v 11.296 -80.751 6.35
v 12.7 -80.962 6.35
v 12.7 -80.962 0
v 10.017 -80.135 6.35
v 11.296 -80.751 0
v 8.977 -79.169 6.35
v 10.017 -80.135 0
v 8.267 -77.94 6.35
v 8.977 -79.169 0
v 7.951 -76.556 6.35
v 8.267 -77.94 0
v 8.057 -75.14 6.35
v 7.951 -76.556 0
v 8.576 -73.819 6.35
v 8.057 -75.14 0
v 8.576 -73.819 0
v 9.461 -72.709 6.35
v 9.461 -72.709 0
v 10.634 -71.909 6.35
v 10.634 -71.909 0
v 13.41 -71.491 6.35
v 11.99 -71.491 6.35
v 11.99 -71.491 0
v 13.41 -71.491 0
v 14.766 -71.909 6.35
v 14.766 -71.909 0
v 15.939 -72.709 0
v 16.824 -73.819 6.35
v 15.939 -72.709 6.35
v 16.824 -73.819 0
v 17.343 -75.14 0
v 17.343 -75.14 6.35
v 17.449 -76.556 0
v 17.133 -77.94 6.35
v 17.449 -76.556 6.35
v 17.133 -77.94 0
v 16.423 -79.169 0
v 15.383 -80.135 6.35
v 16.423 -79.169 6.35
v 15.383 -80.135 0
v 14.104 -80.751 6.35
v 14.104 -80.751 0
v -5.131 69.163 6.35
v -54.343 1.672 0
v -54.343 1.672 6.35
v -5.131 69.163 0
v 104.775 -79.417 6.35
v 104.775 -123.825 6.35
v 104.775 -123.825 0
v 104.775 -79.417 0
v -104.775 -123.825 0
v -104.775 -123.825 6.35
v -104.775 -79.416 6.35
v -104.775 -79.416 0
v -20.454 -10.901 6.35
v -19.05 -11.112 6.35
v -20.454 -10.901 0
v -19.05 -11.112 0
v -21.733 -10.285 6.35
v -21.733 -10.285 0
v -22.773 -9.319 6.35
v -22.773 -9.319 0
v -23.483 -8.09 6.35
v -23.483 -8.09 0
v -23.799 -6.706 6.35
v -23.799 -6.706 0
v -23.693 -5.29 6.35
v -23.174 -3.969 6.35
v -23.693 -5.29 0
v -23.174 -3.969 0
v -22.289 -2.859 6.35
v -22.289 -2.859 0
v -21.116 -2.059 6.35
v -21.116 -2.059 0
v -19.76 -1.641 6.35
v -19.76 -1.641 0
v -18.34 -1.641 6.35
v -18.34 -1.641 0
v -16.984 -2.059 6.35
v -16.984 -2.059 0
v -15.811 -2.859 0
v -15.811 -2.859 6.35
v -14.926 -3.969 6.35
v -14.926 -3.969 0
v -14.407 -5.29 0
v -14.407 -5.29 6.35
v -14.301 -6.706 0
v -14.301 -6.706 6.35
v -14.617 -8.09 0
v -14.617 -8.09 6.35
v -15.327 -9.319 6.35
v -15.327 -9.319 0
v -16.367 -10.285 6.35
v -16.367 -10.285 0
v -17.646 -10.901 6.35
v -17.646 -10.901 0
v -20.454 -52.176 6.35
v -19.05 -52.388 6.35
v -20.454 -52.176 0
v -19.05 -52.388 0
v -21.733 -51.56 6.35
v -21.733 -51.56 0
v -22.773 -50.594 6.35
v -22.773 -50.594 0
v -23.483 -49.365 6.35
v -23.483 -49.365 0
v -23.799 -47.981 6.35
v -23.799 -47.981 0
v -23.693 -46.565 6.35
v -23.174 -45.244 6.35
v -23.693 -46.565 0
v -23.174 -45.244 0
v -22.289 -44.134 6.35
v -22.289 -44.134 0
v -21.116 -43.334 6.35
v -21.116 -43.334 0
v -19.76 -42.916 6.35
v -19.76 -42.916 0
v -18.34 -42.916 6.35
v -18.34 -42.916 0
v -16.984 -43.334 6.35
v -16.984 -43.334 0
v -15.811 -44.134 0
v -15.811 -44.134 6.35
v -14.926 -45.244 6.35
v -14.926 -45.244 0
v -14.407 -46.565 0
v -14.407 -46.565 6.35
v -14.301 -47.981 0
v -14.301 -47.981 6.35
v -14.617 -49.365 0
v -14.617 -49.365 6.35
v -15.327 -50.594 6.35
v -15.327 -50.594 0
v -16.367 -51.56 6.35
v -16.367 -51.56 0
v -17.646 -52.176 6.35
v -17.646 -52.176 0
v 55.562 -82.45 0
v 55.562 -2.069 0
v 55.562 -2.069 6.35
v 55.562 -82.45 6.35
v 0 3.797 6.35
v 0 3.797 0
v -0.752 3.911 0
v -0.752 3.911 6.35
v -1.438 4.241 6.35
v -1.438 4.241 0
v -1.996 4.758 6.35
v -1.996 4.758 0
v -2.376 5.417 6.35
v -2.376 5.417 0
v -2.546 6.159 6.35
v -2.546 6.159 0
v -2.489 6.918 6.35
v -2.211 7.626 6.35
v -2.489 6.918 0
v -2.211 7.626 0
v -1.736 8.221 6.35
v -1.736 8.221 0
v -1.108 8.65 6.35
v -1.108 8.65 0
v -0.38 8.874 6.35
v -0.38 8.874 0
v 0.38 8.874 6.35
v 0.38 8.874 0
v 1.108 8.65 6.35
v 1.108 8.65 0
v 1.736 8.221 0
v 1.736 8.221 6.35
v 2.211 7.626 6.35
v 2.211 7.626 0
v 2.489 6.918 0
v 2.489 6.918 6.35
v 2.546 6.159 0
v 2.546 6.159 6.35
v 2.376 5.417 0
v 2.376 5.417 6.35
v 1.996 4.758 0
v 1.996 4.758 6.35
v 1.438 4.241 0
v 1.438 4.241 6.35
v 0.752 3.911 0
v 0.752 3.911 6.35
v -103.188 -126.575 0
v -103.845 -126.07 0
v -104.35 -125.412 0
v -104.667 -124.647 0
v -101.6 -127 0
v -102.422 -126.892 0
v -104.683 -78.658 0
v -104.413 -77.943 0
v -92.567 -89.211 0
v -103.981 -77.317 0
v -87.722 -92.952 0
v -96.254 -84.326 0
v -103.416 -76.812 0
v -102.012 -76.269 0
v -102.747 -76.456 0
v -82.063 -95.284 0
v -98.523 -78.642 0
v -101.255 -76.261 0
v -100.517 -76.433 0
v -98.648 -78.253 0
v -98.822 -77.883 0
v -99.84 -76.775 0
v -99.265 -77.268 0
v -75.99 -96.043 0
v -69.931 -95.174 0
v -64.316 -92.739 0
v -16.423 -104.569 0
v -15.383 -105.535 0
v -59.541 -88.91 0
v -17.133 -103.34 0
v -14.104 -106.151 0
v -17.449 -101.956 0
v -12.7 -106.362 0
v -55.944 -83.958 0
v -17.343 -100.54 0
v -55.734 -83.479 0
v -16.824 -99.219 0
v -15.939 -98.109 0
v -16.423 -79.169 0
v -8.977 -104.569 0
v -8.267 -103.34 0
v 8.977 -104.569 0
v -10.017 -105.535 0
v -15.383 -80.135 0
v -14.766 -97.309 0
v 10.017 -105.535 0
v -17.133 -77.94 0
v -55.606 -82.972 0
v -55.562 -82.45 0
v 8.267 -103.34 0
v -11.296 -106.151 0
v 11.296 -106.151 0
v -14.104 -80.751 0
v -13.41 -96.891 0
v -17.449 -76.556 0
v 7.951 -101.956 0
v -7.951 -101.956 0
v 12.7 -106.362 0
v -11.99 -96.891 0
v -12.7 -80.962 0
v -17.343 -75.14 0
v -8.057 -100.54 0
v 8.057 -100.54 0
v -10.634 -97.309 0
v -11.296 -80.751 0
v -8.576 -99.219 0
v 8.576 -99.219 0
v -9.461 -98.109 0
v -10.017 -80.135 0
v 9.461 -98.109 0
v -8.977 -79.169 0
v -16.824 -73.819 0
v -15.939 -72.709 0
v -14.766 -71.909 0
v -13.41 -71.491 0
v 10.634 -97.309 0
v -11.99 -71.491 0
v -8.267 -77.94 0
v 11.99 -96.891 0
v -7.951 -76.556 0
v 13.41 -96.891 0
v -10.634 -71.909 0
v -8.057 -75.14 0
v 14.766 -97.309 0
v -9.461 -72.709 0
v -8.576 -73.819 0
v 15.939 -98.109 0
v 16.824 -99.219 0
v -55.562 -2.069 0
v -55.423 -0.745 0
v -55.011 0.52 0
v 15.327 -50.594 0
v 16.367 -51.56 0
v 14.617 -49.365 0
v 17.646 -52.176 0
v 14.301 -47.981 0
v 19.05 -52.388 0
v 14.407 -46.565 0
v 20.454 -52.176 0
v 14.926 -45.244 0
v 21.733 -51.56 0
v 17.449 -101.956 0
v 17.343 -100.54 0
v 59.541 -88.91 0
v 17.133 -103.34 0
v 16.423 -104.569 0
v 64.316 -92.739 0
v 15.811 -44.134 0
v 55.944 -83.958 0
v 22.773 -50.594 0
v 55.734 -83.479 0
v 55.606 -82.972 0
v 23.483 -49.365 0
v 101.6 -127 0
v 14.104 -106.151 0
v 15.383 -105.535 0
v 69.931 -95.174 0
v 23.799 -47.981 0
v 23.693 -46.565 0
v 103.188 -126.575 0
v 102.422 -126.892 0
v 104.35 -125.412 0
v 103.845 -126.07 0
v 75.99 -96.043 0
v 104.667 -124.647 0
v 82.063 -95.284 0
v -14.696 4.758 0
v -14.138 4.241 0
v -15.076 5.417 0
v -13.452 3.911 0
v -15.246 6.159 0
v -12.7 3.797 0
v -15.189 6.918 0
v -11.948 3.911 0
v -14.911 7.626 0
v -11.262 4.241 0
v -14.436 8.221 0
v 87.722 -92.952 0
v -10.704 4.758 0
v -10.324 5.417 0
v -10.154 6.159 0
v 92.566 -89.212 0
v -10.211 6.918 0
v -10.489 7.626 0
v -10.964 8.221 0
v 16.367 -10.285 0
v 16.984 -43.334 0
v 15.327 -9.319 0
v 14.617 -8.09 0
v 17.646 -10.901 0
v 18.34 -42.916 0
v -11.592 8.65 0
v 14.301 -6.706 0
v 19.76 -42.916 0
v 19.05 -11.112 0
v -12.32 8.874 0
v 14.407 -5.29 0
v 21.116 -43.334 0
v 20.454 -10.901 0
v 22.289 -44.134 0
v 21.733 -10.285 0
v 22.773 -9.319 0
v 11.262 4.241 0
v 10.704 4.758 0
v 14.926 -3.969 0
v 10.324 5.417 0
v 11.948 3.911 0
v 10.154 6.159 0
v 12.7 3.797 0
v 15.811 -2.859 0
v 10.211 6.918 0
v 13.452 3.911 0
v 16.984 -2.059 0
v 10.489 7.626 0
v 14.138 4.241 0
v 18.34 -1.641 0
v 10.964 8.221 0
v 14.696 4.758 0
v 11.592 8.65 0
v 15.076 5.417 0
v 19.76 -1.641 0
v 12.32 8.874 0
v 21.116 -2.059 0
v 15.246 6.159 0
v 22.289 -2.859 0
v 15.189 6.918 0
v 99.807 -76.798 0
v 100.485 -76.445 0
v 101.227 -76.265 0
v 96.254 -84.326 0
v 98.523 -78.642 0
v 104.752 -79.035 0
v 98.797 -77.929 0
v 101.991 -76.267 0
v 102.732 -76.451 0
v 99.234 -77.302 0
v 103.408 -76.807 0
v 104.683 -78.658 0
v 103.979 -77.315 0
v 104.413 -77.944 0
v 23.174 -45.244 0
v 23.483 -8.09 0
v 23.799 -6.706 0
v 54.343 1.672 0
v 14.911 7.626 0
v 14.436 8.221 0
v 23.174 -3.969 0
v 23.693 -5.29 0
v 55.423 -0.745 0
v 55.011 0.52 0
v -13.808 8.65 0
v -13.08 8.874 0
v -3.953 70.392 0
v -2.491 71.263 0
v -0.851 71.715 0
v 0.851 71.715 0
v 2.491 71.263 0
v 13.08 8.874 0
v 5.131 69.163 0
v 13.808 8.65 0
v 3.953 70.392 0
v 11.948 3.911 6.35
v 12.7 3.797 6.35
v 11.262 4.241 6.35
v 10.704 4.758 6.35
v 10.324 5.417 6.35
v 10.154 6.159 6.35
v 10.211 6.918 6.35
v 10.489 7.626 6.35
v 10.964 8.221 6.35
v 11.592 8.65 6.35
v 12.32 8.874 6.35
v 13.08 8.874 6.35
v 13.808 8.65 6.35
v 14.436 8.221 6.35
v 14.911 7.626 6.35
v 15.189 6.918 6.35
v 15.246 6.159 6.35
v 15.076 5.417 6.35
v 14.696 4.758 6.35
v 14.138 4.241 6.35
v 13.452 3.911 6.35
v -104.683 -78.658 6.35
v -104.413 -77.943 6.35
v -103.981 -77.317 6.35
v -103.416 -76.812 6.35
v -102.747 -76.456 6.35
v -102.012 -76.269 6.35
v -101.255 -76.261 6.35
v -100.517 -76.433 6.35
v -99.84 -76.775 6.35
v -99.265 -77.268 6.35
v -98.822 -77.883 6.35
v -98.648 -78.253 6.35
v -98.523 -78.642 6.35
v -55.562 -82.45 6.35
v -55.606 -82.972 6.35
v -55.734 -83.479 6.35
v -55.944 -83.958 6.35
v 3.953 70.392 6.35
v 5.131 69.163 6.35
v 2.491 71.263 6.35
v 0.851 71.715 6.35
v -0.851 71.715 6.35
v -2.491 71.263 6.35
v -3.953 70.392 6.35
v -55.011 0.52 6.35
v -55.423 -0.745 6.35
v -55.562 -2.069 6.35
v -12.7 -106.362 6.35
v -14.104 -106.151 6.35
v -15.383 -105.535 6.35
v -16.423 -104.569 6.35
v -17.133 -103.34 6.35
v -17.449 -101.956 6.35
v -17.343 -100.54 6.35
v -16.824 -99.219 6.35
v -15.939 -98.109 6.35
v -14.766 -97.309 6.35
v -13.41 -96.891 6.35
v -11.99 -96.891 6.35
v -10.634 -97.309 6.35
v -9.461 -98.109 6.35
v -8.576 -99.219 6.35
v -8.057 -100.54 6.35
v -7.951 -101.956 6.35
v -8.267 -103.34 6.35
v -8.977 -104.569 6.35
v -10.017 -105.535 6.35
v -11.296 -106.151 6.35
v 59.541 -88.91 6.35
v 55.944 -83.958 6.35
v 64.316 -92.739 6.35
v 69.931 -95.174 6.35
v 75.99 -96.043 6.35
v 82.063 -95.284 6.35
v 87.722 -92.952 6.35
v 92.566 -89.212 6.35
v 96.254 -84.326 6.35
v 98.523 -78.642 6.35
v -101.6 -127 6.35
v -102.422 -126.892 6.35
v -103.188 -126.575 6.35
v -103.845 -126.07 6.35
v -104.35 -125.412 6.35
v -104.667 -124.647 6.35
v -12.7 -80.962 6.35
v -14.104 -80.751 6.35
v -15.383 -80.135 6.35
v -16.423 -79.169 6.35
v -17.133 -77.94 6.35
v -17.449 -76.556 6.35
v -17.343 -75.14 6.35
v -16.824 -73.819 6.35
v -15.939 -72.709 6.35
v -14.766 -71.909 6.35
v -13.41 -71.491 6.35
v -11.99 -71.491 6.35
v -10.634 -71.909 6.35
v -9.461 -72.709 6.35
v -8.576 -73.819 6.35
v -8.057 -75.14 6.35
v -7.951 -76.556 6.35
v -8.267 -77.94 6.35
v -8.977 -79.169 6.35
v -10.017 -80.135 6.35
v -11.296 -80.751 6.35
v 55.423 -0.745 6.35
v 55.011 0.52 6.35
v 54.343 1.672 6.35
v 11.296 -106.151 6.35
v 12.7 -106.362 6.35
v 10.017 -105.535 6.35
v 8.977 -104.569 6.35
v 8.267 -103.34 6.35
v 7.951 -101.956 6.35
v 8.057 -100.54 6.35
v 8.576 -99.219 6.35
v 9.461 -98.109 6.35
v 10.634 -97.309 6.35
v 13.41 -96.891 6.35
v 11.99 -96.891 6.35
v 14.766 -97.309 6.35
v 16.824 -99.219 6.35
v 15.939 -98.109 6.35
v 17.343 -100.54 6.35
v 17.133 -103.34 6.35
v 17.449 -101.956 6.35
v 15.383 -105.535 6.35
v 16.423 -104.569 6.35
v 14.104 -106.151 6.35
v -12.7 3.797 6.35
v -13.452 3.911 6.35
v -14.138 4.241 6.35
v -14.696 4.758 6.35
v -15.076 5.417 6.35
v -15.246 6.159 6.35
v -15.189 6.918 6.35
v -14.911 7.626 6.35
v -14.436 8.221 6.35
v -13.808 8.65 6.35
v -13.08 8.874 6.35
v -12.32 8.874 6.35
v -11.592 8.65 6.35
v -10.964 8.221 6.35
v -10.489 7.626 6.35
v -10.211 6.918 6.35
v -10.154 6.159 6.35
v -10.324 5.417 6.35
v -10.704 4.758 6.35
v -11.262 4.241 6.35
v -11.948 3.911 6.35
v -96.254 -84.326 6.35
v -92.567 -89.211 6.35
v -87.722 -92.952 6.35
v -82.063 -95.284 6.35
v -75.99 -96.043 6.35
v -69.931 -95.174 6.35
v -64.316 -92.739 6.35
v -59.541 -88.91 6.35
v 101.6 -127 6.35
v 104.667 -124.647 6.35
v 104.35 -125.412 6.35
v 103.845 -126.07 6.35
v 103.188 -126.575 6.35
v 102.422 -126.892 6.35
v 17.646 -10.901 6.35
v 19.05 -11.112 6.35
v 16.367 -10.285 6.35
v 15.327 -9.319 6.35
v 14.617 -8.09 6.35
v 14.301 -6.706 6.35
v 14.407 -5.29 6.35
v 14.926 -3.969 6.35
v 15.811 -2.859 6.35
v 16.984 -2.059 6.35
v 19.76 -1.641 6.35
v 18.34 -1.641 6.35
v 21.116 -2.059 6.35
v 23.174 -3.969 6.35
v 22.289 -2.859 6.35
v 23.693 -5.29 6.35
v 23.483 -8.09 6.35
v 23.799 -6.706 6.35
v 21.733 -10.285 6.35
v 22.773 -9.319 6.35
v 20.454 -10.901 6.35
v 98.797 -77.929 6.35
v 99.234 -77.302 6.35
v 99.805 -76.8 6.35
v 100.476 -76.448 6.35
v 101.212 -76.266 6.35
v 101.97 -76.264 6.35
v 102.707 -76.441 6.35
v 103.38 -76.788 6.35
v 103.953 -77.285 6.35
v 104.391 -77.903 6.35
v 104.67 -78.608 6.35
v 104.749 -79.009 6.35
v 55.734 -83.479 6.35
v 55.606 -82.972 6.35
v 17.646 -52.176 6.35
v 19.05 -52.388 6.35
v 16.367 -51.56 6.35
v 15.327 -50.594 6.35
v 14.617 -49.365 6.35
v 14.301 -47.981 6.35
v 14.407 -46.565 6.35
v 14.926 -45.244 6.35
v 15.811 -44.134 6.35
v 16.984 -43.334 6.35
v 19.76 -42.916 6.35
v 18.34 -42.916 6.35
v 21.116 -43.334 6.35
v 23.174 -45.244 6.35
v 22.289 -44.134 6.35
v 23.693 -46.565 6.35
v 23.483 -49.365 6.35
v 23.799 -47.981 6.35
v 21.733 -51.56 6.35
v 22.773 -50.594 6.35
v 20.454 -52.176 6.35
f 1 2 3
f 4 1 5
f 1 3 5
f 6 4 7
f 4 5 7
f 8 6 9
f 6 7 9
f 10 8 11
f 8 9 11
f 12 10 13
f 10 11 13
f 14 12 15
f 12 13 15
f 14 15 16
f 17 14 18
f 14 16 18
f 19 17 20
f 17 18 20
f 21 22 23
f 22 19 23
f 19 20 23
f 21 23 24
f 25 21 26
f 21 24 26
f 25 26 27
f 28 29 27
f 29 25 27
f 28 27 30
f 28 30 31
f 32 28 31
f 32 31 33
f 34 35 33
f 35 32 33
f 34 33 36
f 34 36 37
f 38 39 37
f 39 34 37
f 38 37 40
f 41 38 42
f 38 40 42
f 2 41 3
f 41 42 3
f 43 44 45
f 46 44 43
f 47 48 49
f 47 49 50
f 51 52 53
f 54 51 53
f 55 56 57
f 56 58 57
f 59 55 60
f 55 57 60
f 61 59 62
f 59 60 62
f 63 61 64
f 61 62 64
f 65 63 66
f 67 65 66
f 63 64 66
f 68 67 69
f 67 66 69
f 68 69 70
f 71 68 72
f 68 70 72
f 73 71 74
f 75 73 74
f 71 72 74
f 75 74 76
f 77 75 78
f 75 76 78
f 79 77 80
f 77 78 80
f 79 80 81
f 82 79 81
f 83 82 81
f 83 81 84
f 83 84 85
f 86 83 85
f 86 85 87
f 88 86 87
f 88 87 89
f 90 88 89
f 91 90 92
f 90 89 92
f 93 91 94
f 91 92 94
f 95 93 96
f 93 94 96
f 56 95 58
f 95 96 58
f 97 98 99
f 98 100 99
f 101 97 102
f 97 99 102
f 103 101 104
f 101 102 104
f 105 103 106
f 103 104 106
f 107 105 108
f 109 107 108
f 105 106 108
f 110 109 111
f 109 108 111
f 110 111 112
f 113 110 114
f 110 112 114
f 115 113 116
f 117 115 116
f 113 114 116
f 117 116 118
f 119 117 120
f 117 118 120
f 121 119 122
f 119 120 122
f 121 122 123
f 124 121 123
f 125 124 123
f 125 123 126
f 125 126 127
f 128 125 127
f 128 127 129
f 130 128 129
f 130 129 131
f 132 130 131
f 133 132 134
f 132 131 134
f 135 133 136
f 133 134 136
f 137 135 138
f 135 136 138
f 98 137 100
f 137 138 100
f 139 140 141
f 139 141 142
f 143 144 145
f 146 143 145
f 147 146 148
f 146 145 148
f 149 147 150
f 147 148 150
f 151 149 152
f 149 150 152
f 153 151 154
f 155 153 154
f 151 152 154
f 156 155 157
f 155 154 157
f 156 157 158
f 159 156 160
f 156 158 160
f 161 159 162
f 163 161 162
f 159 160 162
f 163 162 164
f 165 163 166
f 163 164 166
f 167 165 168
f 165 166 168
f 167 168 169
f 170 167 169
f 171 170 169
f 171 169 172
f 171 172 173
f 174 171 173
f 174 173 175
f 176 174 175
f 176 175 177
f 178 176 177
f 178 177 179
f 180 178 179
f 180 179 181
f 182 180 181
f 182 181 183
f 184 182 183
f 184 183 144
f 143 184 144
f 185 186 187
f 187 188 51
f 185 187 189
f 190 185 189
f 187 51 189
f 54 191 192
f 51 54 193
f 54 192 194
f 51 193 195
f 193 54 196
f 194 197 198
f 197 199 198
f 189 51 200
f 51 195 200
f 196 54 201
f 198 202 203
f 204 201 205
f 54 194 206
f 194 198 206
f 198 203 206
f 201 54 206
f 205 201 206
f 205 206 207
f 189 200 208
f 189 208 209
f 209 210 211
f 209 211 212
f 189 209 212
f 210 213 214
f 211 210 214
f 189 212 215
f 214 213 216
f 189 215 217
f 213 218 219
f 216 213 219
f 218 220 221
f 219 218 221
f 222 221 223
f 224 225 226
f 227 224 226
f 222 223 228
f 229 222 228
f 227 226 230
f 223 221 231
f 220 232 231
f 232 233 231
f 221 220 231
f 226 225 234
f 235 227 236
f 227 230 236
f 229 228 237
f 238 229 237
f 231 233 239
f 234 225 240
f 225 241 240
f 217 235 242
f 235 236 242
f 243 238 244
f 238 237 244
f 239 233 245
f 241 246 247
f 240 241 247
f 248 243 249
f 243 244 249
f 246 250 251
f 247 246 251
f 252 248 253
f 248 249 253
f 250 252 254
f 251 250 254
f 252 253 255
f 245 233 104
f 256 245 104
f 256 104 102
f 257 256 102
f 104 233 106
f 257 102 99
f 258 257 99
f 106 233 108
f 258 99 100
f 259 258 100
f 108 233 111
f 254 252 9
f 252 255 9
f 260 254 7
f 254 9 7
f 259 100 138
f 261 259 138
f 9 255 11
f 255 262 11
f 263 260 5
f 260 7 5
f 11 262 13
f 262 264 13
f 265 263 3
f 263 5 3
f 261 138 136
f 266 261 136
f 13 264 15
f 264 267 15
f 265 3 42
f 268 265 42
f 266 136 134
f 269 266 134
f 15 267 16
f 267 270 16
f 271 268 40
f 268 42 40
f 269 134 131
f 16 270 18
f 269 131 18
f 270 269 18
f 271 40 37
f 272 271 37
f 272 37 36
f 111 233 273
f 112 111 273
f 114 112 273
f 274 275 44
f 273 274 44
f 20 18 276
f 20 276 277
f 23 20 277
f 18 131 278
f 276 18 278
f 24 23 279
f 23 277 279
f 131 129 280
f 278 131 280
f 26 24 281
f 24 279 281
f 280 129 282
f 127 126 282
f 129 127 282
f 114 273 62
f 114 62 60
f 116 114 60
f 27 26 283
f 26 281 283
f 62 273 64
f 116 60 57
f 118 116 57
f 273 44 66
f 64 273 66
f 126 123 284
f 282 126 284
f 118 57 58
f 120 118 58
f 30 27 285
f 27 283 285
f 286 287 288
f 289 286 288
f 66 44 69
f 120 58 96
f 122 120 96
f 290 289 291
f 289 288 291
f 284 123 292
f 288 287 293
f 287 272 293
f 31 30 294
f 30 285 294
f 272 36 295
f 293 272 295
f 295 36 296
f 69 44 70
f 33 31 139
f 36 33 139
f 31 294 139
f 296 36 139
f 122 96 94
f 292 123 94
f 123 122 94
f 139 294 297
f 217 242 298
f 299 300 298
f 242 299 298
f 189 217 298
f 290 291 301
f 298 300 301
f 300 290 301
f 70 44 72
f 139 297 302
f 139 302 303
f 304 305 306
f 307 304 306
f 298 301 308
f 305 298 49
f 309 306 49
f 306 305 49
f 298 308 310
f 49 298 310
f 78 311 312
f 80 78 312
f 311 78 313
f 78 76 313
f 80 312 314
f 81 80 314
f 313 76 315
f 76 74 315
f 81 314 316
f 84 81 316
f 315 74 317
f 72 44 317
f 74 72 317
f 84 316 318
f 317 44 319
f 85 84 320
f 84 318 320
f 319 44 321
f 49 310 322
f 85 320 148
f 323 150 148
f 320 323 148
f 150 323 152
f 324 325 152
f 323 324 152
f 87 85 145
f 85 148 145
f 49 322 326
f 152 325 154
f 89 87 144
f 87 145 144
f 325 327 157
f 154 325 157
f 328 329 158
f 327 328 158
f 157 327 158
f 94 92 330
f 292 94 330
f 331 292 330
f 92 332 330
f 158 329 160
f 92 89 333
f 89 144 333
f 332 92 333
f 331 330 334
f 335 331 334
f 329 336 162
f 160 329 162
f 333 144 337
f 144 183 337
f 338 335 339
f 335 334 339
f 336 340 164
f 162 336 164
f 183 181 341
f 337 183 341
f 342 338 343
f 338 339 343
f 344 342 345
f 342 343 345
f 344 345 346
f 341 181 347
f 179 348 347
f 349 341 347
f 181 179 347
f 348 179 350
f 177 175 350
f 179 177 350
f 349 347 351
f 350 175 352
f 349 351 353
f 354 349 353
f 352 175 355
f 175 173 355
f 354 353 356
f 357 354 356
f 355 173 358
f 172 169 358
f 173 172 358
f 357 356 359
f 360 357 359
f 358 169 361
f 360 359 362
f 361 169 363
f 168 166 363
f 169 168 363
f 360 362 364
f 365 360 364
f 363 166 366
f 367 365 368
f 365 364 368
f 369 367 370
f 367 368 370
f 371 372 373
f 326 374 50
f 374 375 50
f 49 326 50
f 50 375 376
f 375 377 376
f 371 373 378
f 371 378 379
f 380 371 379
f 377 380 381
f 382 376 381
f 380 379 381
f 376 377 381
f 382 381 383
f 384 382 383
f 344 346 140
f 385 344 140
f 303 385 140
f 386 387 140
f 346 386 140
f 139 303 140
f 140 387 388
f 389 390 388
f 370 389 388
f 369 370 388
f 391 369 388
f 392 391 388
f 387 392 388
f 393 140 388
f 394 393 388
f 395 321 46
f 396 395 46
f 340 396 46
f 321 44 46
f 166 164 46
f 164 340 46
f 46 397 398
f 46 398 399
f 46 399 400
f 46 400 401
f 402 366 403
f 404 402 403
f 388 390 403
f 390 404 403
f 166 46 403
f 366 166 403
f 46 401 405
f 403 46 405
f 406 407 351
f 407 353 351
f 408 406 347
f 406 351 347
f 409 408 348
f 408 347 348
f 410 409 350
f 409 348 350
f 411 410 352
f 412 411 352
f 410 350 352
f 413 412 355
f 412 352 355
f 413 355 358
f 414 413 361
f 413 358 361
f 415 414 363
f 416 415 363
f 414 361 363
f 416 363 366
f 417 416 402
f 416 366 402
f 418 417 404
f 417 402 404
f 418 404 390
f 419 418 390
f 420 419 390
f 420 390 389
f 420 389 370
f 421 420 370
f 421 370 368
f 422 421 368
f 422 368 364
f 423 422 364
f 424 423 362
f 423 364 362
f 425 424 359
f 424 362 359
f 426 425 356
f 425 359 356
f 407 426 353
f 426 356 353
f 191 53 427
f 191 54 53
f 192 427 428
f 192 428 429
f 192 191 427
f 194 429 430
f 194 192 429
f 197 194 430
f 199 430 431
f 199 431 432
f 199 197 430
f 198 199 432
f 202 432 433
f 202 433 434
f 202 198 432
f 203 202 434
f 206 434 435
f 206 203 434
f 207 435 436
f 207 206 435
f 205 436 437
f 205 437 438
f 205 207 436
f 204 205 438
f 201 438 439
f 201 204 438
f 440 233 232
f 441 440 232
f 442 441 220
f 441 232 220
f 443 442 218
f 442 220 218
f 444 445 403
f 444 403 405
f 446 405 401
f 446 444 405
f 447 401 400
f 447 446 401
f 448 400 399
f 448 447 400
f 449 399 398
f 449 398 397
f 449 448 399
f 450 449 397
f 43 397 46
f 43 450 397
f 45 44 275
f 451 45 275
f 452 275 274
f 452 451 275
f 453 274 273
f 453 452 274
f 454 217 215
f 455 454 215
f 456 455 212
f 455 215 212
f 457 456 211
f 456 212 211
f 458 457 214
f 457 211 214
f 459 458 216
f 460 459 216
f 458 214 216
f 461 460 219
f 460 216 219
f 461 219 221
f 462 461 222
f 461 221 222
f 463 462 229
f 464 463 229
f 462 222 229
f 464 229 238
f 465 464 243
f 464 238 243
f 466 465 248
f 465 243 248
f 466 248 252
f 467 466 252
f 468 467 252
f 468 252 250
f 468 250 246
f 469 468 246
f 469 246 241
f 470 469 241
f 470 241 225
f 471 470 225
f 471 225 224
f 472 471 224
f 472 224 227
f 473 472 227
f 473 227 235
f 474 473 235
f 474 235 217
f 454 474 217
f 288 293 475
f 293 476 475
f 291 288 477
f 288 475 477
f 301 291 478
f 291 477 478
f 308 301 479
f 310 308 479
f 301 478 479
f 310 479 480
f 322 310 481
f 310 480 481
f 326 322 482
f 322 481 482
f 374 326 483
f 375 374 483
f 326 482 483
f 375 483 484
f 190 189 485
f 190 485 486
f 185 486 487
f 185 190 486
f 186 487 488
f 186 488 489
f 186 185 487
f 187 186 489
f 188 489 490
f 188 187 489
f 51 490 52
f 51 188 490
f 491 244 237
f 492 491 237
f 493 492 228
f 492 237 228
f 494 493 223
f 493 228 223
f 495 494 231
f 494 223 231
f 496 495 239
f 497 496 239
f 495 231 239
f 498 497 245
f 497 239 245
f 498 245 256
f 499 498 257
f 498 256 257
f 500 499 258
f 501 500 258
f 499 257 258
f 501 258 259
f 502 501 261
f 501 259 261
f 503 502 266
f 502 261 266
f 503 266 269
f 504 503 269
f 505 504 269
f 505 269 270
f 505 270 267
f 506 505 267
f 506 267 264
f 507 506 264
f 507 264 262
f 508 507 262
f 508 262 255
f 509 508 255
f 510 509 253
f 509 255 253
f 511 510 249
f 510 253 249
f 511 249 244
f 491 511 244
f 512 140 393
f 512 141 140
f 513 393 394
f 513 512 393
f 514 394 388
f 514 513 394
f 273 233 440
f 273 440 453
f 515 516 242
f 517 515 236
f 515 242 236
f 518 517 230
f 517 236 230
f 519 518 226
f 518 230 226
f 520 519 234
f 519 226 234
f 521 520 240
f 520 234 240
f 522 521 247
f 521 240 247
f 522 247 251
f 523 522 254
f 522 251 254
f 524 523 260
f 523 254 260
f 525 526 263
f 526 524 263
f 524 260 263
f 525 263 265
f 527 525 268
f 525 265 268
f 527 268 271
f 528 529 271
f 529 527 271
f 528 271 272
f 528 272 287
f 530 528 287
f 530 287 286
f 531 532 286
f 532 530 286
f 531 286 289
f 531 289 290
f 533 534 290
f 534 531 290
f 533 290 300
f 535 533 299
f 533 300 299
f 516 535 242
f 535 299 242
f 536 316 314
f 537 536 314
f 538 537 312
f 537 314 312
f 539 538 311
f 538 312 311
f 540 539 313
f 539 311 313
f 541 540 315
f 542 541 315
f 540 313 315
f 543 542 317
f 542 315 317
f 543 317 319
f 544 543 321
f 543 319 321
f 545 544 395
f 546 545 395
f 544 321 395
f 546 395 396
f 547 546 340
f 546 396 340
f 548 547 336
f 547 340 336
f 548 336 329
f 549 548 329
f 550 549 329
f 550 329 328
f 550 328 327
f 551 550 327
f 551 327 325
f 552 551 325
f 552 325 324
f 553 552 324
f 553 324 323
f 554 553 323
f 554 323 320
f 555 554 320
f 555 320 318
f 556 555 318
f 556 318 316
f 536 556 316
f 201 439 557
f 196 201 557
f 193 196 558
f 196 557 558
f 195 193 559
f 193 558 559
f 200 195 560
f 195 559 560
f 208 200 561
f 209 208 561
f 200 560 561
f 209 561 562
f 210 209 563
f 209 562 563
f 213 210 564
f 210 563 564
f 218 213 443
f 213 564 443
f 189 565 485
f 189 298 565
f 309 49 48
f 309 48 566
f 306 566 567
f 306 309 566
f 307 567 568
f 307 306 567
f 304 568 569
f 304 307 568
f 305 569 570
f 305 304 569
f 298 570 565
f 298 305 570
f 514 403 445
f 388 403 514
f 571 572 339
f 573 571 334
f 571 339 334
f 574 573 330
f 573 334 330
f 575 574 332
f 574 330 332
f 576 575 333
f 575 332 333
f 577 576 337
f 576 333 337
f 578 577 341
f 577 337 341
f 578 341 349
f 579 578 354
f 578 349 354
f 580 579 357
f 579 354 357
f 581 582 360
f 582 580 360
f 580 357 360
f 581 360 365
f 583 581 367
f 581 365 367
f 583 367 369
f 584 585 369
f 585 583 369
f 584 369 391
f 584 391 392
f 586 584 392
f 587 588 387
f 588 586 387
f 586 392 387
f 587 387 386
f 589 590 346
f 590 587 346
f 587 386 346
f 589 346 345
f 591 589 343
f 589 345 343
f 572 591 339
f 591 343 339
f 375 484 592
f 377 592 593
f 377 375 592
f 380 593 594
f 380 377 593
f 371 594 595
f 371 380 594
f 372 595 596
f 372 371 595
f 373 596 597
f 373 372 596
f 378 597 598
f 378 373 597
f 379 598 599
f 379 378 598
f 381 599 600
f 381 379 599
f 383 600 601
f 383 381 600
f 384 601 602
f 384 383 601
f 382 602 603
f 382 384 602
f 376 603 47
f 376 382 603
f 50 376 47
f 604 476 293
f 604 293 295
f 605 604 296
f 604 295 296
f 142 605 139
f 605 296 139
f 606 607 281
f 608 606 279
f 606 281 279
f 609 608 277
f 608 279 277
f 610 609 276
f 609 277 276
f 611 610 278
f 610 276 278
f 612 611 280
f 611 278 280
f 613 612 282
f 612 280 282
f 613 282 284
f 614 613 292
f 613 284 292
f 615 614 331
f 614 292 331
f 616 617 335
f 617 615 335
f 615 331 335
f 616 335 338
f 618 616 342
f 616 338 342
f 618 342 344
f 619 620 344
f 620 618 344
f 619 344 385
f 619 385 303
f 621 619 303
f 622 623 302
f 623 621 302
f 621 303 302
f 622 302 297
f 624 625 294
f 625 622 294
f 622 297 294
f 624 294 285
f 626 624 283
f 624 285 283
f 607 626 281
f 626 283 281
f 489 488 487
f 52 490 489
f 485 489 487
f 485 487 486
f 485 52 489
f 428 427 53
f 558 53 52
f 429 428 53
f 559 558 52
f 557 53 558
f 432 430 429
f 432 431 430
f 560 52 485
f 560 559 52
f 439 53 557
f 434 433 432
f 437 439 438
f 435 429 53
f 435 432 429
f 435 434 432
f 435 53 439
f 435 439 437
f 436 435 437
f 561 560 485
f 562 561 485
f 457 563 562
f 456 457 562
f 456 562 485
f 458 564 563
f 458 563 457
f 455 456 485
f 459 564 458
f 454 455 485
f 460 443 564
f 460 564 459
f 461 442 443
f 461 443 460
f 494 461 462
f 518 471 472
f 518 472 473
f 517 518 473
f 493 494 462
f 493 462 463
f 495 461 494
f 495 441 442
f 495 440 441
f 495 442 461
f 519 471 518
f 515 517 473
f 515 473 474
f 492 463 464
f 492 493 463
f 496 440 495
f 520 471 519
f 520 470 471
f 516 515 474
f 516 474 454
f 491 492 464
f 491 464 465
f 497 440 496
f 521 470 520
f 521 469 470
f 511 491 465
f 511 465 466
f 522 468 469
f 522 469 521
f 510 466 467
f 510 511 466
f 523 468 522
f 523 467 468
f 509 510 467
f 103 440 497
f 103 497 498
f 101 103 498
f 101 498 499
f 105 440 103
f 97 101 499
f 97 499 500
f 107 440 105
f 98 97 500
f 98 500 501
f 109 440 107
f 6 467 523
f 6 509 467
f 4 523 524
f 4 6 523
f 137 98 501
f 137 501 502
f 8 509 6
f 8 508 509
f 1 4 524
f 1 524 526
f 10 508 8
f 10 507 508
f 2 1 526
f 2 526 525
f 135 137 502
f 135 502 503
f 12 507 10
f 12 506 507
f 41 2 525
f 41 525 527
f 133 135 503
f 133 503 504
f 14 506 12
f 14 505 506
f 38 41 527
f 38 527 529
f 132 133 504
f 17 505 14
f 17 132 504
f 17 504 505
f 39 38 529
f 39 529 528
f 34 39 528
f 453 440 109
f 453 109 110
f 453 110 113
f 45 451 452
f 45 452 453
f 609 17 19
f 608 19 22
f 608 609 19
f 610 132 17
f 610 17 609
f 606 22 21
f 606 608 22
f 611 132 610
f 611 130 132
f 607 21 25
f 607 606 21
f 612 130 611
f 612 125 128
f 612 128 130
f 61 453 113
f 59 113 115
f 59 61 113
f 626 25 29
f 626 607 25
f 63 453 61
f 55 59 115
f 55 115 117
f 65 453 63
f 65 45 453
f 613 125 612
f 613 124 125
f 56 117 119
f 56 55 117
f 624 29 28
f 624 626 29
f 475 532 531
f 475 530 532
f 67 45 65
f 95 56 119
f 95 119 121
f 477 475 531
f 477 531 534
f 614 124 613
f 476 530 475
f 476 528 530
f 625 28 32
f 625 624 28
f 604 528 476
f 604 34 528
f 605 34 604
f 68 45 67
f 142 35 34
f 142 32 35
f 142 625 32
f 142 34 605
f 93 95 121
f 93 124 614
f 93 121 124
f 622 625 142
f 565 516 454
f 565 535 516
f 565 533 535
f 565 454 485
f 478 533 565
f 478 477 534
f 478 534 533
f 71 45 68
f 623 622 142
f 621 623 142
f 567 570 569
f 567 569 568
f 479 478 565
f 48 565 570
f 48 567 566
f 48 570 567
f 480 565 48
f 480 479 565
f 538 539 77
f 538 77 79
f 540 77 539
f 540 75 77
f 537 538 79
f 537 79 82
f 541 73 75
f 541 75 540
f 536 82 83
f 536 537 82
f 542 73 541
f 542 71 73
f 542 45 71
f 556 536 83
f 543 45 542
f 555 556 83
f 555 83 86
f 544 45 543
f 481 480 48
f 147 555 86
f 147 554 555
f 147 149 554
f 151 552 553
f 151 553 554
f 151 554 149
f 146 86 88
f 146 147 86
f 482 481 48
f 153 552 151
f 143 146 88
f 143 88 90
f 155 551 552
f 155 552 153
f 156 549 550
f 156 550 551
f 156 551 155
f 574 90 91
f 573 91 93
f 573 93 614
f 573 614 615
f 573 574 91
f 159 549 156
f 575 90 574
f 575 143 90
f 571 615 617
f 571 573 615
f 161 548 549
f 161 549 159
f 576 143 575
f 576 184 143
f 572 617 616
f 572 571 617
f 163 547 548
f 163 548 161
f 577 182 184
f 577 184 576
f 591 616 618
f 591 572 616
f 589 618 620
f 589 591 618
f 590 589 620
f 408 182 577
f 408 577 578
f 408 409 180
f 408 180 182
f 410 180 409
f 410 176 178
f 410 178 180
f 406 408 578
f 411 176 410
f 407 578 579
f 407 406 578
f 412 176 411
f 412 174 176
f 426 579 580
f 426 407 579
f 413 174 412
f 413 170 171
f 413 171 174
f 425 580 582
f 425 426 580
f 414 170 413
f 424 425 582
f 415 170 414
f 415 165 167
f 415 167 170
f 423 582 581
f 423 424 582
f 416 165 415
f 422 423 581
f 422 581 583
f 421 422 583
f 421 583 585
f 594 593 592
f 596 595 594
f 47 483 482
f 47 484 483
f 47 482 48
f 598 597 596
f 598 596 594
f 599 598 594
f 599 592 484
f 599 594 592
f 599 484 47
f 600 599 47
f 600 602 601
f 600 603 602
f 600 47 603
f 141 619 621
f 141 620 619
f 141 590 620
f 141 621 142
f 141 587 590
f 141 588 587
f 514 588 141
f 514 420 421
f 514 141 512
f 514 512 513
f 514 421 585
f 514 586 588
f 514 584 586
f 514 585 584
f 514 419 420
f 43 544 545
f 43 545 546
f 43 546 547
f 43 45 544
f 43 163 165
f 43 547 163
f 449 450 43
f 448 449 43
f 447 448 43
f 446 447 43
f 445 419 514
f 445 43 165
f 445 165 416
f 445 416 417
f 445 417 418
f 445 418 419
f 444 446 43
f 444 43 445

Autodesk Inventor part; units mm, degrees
ref_plane "YZ Plane" through (0, 0, 0) normal (1, 0, 0) x (0, 1, 0)
ref_plane "XZ Plane" through (0, 0, 0) normal (0, 1, 0) x (-1, 0, 0)
ref_plane "XY Plane" through (0, 0, 0) normal (0, 0, 1) x (1, 0, 0)
sketch "Sketch1" plane through (0, 0, 0) normal (0, 0, 1) x (1, 0, 0)
  line L0 (55.5625, 0) -> (-55.5625, 0)
  line L1 (-55.5625, 0) -> (0, 76.2)
  line L2 (0, 76.2) -> (55.5625, 0)
  line L3 (-55.5625, 0) -> (55.5625, 0)
  line L4 (55.5625, 0) -> (55.5625, -127)
  line L5 (55.5625, -127) -> (-55.5625, -127)
  line L6 (-55.5625, -127) -> (-55.5625, 0)
  point P0 (0, 0)
  point P1 (0, 0)
  dimension "d0" = 111.125
  dimension "d1" = 76.2
  dimension "d14" = 127
extrude "Extrusion1" add sketch "Sketch1" along normal blind 6.35
sketch "Sketch2" plane through (0, 0, 6.35) normal (0, 0, 1) x (1, 0, 0)
  line L0 (-12.7, 6.35) -> (12.7, 6.35) construction
  line L1 (-55.5625, -127) -> (55.5625, -127) construction
  point P0 (0, 6.35)
  point P1 (0, 6.35)
  point P2 (0, 76.2)
  dimension "d6" = 25.4
  dimension "d15" = 133.35
hole "Hole1" at (-12.7, 6.35, 6.35) at (0, 6.35, 6.35) at (12.7, 6.35, 6.35) direction (0, 0, -1) diameter 5.1054 end through all clearance for "Flat Head Machine Screw (82)" size "#10" standard "Ansi Unified Screw Threads"
fillet "Fillet2" radius 6.35 5 edges at (-55.5625, 0, 3.175) (55.5625, 0, 3.175) (0, 76.2, 3.175) (-55.5625, -127, 3.175) (55.5625, -127, 3.175)
sketch "Sketch3" plane through (0, 0, 6.35) normal (0, 0, 1) x (1, 0, 0)
  arc A0 (49.2125, -127) -> (55.5625, -120.65) centre (49.2125, -120.65) ccw construction
  line L0 (55.5625, -120.65) -> (55.5625, -2.0693) construction
  arc A1 (55.5625, -2.0693) -> (54.3433, 1.672) centre (49.2125, -2.0693) ccw construction
  line L1 (54.3433, 1.672) -> (5.1308, 69.1634) construction
  arc A2 (5.1308, 69.1634) -> (-5.1308, 69.1634) centre (0, 65.4222) ccw construction
  line L2 (-5.1308, 69.1634) -> (-54.3433, 1.672) construction
  arc A3 (-54.3433, 1.672) -> (-55.5625, -2.0693) centre (-49.2125, -2.0693) ccw construction
  line L3 (-55.5625, -2.0693) -> (-55.5625, -120.65) construction
  arc A4 (-55.5625, -120.65) -> (-49.2125, -127) centre (-49.2125, -120.65) ccw construction
  line L4 (-49.2125, -127) -> (49.2125, -127) construction
  circle A5 centre (0, 6.35) radius 2.5527 construction
  circle A6 centre (-12.7, 6.35) radius 2.5527 construction
  circle A7 centre (12.7, 6.35) radius 2.5527 construction
  line L5 (0, 31.75) -> (-30.7945, 0.9555) construction
  line L6 (0, 31.75) -> (30.7945, 0.9555) construction
  point P0 (0, 0)
  dimension "d17" = 25.4
sketch "Sketch4" plane through (0, 0, 6.35) normal (0, 0, 1) x (1, 0, 0)
  arc A0 (49.2125, -127) -> (55.5625, -120.65) centre (49.2125, -120.65) ccw construction
  line L0 (55.5625, -120.65) -> (55.5625, -2.0693) construction
  arc A1 (55.5625, -2.0693) -> (54.3433, 1.672) centre (49.2125, -2.0693) ccw construction
  line L1 (54.3433, 1.672) -> (5.1308, 69.1634) construction
  arc A2 (5.1308, 69.1634) -> (-5.1308, 69.1634) centre (0, 65.4222) ccw construction
  line L2 (-5.1308, 69.1634) -> (-54.3433, 1.672) construction
  arc A3 (-54.3433, 1.672) -> (-55.5625, -2.0693) centre (-49.2125, -2.0693) ccw construction
  line L3 (-55.5625, -2.0693) -> (-55.5625, -120.65) construction
  arc A4 (-55.5625, -120.65) -> (-49.2125, -127) centre (-49.2125, -120.65) ccw construction
  line L4 (-49.2125, -127) -> (49.2125, -127) construction
  circle A5 centre (0, 6.35) radius 2.5527 construction
  circle A6 centre (-12.7, 6.35) radius 2.5527 construction
  circle A7 centre (12.7, 6.35) radius 2.5527 construction
  point P0 (0, 0)
  point P1 (-12.7, -101.6)
  point P2 (-12.7, -76.2)
  point P3 (-19.05, -47.625)
  point P4 (-19.05, -6.35)
  dimension "d24" = 12.7
  dimension "d25" = 19.05
  dimension "d26" = 53.975
  dimension "d27" = 19.05
  dimension "d28" = 12.7
  dimension "d29" = 82.55
  dimension "d30" = 107.95
hole "Hole2" at (-12.7, -101.6, 6.35) at (-12.7, -76.2, 6.35) at (-19.05, -47.625, 6.35) at (-19.05, -6.35, 6.35) direction (0, 0, -1) diameter 9.525 end through all
mirror "Mirror1" about plane through (0, 0, 0) normal (1, 0, 0) of "Hole2"
sketch "Sketch5" plane through (0, 0, 6.35) normal (0, 0, 1) x (1, 0, 0)
  circle A0 centre (-76.2, -73.025) radius 16.6688 construction
  circle A1 centre (76.2, -73.025) radius 16.6688 construction
  line L0 (-76.2, -73.025) -> (76.2, -73.025) construction
  line L1 (-49.2125, -127) -> (49.2125, -127) construction
  circle A2 centre (-76.2, -73.025) radius 23.0187 construction
  circle A3 centre (76.2, -73.025) radius 23.0187 construction
  line L2 (0, -127) -> (-104.775, -127)
  line L3 (0, -127) -> (104.775, -127)
  circle A4 centre (19.05, -47.625) radius 4.7625 construction
  circle A5 centre (19.05, -6.35) radius 4.7625 construction
  circle A6 centre (12.7, -76.2) radius 4.7625 construction
  circle A7 centre (12.7, -101.6) radius 4.7625 construction
  circle A8 centre (-19.05, -47.625) radius 4.7625 construction
  circle A9 centre (-12.7, -101.6) radius 4.7625 construction
  circle A10 centre (-12.7, -76.2) radius 4.7625 construction
  circle A11 centre (-19.05, -6.35) radius 4.7625 construction
  arc A12 (49.2125, -127) -> (55.5625, -120.65) centre (49.2125, -120.65) ccw projected
  line L4 (55.5625, -120.65) -> (55.5625, -2.0693) projected
  arc A13 (55.5625, -2.0693) -> (54.3433, 1.672) centre (49.2125, -2.0693) ccw construction
  line L5 (54.3433, 1.672) -> (5.1308, 69.1634) construction
  arc A14 (5.1308, 69.1634) -> (-5.1308, 69.1634) centre (0, 65.4222) ccw construction
  line L6 (-5.1308, 69.1634) -> (-54.3433, 1.672) construction
  arc A15 (-54.3433, 1.672) -> (-55.5625, -2.0693) centre (-49.2125, -2.0693) ccw construction
  line L7 (-55.5625, -2.0693) -> (-55.5625, -120.65) projected
  arc A16 (-55.5625, -120.65) -> (-49.2125, -127) centre (-49.2125, -120.65) ccw projected
  line L8 (-49.2125, -127) -> (49.2125, -127) construction
  circle A17 centre (0, 6.35) radius 2.5527 construction
  circle A18 centre (-12.7, 6.35) radius 2.5527 construction
  circle A19 centre (12.7, 6.35) radius 2.5527 construction
  arc A20 (-99.2187, -73.025) -> (-55.5625, -83.2209) centre (-76.2, -73.025) ccw
  line L9 (55.5625, -120.65) -> (55.5625, -2.0693) construction
  arc A21 (55.5625, -83.2209) -> (99.2188, -73.025) centre (76.2, -73.025) ccw
  line L10 (-104.775, -127) -> (-104.775, -73.025)
  line L11 (104.775, -127) -> (104.775, -73.025)
  line L12 (-104.775, -73.025) -> (-99.2187, -73.025)
  line L13 (99.2188, -73.025) -> (104.775, -73.025)
  point P0 (0, 0)
  point P1 (0, -73.025)
  dimension "d40" = 152.4
  dimension "d41" = 53.975
  dimension "d42" = 33.3375
  dimension "d43" = 6.35
  dimension "d46" = 104.775
extrude "Extrusion3" add sketch "Sketch5" against normal up to surface (6.35 mm away)
fillet "Fillet3" radius 3.175 8 edges at (-104.775, -73.025, 3.175) (-99.2187, -73.025, 3.175) (-55.5625, -83.2209, 3.175) (55.5625, -83.2209, 3.175) (99.2188, -73.025, 3.175) (104.775, -73.025, 3.175) (-104.775, -127, 3.175) (104.775, -127, 3.175)
properties part number "CL7-017" material "Polycarbonate, Smoke"
